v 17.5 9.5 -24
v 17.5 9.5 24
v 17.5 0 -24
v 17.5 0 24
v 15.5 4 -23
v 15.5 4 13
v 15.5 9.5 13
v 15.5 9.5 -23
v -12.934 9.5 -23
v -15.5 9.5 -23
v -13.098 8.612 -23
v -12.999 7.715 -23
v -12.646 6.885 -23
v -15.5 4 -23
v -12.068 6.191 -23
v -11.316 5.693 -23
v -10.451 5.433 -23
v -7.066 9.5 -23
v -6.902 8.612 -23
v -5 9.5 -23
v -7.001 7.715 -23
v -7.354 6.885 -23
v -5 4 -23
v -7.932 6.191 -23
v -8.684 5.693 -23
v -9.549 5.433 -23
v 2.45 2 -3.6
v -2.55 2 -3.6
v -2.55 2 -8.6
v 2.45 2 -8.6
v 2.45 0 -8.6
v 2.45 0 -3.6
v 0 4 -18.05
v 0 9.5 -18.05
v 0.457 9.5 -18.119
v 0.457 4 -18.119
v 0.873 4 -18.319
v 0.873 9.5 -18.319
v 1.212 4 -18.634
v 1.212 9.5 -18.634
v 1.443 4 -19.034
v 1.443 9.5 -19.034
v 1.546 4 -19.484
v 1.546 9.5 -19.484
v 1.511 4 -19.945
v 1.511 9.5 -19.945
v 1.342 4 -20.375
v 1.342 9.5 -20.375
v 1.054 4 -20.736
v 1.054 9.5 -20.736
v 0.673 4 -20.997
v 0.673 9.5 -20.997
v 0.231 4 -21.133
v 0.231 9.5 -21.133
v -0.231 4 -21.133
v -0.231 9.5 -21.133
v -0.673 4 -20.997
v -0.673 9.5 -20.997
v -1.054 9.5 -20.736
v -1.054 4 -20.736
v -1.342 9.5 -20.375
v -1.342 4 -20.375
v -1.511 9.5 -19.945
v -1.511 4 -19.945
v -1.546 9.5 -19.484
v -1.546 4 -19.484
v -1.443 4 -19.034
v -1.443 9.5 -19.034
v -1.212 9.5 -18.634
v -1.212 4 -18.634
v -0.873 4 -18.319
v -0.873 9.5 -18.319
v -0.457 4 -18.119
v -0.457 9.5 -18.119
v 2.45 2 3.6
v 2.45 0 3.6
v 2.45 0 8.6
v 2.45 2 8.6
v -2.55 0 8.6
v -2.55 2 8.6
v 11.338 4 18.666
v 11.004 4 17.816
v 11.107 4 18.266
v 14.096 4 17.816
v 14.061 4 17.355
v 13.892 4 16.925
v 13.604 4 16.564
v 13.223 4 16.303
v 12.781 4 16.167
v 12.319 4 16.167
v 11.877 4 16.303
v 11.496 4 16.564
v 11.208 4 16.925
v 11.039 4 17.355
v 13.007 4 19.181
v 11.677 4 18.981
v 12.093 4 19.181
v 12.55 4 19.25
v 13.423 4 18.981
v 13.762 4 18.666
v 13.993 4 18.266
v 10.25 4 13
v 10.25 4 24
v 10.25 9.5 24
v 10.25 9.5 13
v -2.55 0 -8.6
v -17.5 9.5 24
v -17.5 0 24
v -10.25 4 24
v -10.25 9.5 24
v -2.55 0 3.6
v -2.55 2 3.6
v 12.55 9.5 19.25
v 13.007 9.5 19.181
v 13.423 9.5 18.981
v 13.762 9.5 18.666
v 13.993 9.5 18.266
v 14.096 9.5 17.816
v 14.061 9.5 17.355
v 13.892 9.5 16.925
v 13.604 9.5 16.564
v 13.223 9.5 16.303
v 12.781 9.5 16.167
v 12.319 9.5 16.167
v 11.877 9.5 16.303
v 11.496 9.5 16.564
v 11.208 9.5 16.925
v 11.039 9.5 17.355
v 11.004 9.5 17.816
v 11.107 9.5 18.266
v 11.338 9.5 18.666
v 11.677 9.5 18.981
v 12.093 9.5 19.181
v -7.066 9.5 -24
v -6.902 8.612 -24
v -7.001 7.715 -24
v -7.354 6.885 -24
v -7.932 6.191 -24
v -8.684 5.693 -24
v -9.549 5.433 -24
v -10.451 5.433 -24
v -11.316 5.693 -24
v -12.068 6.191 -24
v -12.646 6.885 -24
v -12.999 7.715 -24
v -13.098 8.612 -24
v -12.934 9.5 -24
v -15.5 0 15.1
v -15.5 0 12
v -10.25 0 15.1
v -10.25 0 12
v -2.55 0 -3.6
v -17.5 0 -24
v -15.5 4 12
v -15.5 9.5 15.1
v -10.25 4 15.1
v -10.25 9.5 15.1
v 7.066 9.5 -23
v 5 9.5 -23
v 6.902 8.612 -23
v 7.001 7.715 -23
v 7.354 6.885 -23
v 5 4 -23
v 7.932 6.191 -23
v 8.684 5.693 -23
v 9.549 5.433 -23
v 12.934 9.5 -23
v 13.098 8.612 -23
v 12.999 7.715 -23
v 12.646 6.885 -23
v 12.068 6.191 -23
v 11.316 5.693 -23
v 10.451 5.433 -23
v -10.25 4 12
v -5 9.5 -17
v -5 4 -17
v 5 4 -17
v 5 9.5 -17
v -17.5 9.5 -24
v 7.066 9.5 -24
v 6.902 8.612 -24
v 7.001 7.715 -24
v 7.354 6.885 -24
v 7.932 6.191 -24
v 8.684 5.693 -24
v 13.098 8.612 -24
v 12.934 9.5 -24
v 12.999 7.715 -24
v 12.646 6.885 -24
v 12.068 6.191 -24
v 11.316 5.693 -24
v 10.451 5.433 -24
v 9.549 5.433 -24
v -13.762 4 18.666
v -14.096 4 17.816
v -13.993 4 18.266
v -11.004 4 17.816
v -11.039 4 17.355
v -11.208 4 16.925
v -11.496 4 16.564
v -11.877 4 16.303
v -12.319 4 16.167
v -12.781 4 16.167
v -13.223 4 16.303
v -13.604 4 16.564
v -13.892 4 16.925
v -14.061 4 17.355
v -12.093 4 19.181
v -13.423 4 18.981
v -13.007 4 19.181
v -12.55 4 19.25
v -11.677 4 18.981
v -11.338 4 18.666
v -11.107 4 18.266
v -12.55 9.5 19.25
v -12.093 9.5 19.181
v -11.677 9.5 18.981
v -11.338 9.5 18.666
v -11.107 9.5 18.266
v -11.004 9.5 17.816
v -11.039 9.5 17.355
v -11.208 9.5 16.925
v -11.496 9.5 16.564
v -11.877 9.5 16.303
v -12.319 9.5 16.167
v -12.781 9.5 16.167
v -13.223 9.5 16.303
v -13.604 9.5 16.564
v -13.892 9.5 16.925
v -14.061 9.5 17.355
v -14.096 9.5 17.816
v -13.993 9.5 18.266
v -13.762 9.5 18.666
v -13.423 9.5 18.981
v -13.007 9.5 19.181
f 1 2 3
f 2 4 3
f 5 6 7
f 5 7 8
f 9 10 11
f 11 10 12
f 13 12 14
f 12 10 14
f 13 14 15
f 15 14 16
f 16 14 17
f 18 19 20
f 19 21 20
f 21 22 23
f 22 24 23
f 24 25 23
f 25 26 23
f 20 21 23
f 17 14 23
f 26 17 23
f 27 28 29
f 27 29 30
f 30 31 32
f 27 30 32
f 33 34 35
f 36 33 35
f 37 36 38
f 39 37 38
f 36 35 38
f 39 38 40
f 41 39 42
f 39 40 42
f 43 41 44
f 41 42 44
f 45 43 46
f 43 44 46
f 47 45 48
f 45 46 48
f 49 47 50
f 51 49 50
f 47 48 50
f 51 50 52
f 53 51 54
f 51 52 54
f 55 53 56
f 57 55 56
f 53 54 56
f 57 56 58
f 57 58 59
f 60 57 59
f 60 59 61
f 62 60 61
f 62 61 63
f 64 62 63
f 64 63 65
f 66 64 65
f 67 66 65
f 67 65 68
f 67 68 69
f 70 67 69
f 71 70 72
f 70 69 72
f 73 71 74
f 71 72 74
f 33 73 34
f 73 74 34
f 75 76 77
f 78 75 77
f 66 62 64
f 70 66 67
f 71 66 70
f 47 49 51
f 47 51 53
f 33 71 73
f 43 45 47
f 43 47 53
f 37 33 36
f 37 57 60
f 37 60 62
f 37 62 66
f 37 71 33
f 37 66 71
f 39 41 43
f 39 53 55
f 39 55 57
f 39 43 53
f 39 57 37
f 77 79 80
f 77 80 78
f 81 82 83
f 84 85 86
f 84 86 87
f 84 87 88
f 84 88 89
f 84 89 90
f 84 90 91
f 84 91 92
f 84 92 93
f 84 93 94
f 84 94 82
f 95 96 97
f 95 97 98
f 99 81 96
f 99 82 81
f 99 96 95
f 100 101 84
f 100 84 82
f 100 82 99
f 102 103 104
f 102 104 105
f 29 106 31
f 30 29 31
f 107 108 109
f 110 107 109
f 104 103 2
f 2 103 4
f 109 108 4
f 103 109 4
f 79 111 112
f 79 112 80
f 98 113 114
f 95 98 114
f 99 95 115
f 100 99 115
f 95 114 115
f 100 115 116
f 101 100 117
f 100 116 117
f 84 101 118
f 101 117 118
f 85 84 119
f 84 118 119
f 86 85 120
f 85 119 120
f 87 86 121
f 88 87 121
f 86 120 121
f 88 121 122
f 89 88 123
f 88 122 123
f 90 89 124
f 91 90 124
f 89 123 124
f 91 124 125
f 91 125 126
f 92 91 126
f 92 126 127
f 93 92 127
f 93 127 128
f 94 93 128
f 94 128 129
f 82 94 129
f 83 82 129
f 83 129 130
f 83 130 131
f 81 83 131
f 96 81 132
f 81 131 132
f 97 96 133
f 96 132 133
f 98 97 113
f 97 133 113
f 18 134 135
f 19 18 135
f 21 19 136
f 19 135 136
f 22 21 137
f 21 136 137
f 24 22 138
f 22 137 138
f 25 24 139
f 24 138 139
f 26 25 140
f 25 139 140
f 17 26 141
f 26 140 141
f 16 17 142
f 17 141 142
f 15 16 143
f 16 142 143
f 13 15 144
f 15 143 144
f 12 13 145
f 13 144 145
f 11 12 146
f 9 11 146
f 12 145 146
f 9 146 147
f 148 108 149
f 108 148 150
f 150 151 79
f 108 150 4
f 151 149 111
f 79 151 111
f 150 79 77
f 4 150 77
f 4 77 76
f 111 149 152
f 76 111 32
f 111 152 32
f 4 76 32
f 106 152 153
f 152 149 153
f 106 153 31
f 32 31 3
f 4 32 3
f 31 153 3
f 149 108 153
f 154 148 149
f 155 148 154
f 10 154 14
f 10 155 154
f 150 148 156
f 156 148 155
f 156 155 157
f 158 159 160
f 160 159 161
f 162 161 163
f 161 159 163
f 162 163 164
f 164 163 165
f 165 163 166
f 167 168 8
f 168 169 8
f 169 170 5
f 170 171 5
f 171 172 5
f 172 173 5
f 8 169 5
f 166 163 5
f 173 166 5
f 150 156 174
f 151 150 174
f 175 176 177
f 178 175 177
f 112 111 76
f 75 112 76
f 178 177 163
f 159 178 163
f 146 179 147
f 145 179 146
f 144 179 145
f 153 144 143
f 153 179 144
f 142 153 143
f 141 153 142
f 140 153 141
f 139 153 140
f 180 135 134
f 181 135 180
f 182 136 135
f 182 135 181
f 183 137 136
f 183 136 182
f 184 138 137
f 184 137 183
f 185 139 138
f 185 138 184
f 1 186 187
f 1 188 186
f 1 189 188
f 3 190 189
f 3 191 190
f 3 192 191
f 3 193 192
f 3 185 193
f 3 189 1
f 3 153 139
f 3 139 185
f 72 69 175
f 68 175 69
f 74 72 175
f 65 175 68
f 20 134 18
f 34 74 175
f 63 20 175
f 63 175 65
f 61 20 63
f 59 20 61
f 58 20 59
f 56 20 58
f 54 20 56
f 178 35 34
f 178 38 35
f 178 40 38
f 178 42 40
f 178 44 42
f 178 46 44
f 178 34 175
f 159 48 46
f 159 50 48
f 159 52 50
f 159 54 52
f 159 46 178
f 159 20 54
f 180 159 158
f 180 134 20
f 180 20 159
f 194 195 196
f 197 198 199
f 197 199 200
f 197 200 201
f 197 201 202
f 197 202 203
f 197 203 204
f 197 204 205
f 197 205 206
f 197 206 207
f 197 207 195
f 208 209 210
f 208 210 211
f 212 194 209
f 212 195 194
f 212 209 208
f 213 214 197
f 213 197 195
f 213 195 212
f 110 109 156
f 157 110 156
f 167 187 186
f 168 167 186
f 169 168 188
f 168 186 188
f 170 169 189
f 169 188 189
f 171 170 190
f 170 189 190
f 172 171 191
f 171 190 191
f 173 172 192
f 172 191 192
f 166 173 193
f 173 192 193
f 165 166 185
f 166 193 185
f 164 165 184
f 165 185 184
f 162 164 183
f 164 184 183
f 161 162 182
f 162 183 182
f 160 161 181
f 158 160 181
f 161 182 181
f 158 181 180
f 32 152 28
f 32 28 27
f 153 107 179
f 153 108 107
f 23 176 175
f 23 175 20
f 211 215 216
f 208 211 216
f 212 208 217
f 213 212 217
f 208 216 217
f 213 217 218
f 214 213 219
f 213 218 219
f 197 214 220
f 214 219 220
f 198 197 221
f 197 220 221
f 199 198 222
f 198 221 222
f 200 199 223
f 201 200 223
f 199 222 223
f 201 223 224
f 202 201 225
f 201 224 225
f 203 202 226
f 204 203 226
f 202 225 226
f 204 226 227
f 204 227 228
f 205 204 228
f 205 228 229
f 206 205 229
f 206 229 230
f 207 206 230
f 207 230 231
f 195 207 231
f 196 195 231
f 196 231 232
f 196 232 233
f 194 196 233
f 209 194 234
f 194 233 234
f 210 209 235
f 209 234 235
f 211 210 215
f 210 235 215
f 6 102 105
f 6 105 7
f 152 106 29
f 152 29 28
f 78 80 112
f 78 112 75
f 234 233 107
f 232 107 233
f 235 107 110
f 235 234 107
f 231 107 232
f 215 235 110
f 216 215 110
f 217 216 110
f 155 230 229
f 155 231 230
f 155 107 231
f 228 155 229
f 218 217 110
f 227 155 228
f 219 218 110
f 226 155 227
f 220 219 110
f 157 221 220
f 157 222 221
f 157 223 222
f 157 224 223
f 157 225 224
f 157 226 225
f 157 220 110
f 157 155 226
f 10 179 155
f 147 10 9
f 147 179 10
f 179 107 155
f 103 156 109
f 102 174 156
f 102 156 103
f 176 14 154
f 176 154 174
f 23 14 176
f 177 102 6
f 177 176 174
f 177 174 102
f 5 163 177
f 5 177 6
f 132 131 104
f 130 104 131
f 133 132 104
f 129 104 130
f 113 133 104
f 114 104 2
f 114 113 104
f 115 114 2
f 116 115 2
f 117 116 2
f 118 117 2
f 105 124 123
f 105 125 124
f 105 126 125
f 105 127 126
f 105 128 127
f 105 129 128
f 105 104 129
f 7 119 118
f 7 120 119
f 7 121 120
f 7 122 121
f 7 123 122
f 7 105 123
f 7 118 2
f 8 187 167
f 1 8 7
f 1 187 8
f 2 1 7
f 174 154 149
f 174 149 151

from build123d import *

# Parameters (mm, degrees)
SKETCH1_W           = 35
SKETCH1_H           = 48
BOSS_EXTRUDE1_DEPTH = 4
SKETCH2_W           = 35
SKETCH2_H           = 48
SKETCH2_W_2         = 31
SKETCH2_H_2         = 44
BOSS_EXTRUDE2_DEPTH = 5.5
SKETCH3_W           = 10
SKETCH3_H           = 6
SKETCH3_W_2         = 5.25
SKETCH3_H_2         = 8
BOSS_EXTRUDE3_DEPTH = 5.5
SKETCH4_W           = 20.5
SKETCH4_H           = 5.5
CUT_EXTRUDE1_DEPTH  = 3
CUT_EXTRUDE2_DEPTH  = 2
CUT_EXTRUDE3_REACH  = 33.185
SKETCH7_W           = 5.25
SKETCH7_H           = 3.1
CUT_EXTRUDE4_START  = 9.5
SKETCH8_R           = 1.55
CUT_EXTRUDE4_DEPTH  = 5.5
SKETCH5_W           = 5
SKETCH5_H           = 5
CUT_EXTRUDE5_DEPTH  = 2


with BuildPart() as part:
    # Sketch1 → Boss-Extrude1 (new body)
    with BuildSketch(Plane(origin=(0, 0, 0), x_dir=(1, 0, 0), z_dir=(0, 1, 0))):
        Rectangle(SKETCH1_W, SKETCH1_H)
    extrude(amount=BOSS_EXTRUDE1_DEPTH)

    # Sketch2 → Boss-Extrude2 (add)
    with BuildSketch(Plane(origin=(0, 4, 0), x_dir=(1, 0, 0), z_dir=(0, 1, 0))):
        Rectangle(SKETCH2_W, SKETCH2_H)
        with Locations((0, 1)):
            Rectangle(SKETCH2_W_2, SKETCH2_H_2, mode=Mode.SUBTRACT)
    extrude(amount=BOSS_EXTRUDE2_DEPTH)

    # Sketch3 → Boss-Extrude3 (add)
    with BuildSketch(Plane(origin=(0, 4, 0), x_dir=(1, 0, 0), z_dir=(0, 1, 0))):
        with Locations((0, 20)):
            Rectangle(SKETCH3_W, SKETCH3_H)
        with Locations((-12.875, -17)):
            Rectangle(SKETCH3_W_2, SKETCH3_H_2)
        with Locations((12.875, -17)):
            Rectangle(SKETCH3_W_2, SKETCH3_H_2)
    extrude(amount=BOSS_EXTRUDE3_DEPTH)

    # Sketch4 → Cut-Extrude1 (cut)
    with BuildSketch(Plane.XY.offset(24)):
        with Locations((0, 6.75)):
            Rectangle(SKETCH4_W, SKETCH4_H)
    extrude(amount=-CUT_EXTRUDE1_DEPTH, mode=Mode.SUBTRACT)

    # Sketch6 → Cut-Extrude2 (cut)
    with BuildSketch(Plane(origin=(0, 0, -24), x_dir=(-1, 0, 0), z_dir=(0, 0, -1))):
        with BuildLine():
            ThreePointArc((-12.93428015, 9.5), (-10, 5.4), (-7.06571985, 9.5))
            Line((-7.06571985, 9.5), (-12.93428015, 9.5))
        make_face()
        with BuildLine():
            Line((12.93428015, 9.5), (7.06571985, 9.5))
            ThreePointArc((7.06571985, 9.5), (10, 5.4), (12.93428015, 9.5))
        make_face()
    extrude(amount=-CUT_EXTRUDE2_DEPTH, mode=Mode.SUBTRACT)

    # Cut-Extrude3: up to this face of the body (flat: up to its plane)
    cut_extrude3_end = Plane(part.part.faces().sort_by_distance((0, 0, 0))[0])
    # Sketch7 → Cut-Extrude3 (cut, up to the picked face)
    with BuildSketch(Plane(origin=(0, 9.5, 0), x_dir=(1, 0, 0), z_dir=(0, 1, 0)), mode=Mode.PRIVATE) as cut_extrude3_sk1:
        with Locations((-12.875, -13.55)):
            Rectangle(SKETCH7_W, SKETCH7_H)
    cut_extrude3_tool1 = split(extrude(cut_extrude3_sk1.sketch, amount=-CUT_EXTRUDE3_REACH, mode=Mode.PRIVATE), bisect_by=cut_extrude3_end, keep=Keep.BOTH, mode=Mode.PRIVATE)
    add(cut_extrude3_tool1.solids().sort_by(Axis((-12.875, 9.5, 13.55), (0, -1, 0)))[0], mode=Mode.SUBTRACT)

    # Sketch8 → Cut-Extrude4 (cut)
    with BuildSketch(Plane(origin=(0, 0, 0), x_dir=(1, 0, 0), z_dir=(0, 1, 0)).offset(CUT_EXTRUDE4_START)):
        with Locations(Location((-12.55, -17.7, 0), (0, 0, 270))):
            Circle(SKETCH8_R)
        with Locations(Location((12.55, -17.7, 0), (0, 0, 270))):
            Circle(SKETCH8_R)
        with Locations(Location((0, 19.6, 0), (0, 0, 270))):
            Circle(SKETCH8_R)
    extrude(amount=-CUT_EXTRUDE4_DEPTH, mode=Mode.SUBTRACT)

    # Sketch5 → Cut-Extrude5 (cut)
    with BuildSketch(Plane.XZ):
        with Locations((-0.05, 6.1)):
            Rectangle(SKETCH5_W, SKETCH5_H)
        with Locations((-0.05, -6.1)):
            Rectangle(SKETCH5_W, SKETCH5_H)
    extrude(amount=-CUT_EXTRUDE5_DEPTH, mode=Mode.SUBTRACT)


solid = part.part
